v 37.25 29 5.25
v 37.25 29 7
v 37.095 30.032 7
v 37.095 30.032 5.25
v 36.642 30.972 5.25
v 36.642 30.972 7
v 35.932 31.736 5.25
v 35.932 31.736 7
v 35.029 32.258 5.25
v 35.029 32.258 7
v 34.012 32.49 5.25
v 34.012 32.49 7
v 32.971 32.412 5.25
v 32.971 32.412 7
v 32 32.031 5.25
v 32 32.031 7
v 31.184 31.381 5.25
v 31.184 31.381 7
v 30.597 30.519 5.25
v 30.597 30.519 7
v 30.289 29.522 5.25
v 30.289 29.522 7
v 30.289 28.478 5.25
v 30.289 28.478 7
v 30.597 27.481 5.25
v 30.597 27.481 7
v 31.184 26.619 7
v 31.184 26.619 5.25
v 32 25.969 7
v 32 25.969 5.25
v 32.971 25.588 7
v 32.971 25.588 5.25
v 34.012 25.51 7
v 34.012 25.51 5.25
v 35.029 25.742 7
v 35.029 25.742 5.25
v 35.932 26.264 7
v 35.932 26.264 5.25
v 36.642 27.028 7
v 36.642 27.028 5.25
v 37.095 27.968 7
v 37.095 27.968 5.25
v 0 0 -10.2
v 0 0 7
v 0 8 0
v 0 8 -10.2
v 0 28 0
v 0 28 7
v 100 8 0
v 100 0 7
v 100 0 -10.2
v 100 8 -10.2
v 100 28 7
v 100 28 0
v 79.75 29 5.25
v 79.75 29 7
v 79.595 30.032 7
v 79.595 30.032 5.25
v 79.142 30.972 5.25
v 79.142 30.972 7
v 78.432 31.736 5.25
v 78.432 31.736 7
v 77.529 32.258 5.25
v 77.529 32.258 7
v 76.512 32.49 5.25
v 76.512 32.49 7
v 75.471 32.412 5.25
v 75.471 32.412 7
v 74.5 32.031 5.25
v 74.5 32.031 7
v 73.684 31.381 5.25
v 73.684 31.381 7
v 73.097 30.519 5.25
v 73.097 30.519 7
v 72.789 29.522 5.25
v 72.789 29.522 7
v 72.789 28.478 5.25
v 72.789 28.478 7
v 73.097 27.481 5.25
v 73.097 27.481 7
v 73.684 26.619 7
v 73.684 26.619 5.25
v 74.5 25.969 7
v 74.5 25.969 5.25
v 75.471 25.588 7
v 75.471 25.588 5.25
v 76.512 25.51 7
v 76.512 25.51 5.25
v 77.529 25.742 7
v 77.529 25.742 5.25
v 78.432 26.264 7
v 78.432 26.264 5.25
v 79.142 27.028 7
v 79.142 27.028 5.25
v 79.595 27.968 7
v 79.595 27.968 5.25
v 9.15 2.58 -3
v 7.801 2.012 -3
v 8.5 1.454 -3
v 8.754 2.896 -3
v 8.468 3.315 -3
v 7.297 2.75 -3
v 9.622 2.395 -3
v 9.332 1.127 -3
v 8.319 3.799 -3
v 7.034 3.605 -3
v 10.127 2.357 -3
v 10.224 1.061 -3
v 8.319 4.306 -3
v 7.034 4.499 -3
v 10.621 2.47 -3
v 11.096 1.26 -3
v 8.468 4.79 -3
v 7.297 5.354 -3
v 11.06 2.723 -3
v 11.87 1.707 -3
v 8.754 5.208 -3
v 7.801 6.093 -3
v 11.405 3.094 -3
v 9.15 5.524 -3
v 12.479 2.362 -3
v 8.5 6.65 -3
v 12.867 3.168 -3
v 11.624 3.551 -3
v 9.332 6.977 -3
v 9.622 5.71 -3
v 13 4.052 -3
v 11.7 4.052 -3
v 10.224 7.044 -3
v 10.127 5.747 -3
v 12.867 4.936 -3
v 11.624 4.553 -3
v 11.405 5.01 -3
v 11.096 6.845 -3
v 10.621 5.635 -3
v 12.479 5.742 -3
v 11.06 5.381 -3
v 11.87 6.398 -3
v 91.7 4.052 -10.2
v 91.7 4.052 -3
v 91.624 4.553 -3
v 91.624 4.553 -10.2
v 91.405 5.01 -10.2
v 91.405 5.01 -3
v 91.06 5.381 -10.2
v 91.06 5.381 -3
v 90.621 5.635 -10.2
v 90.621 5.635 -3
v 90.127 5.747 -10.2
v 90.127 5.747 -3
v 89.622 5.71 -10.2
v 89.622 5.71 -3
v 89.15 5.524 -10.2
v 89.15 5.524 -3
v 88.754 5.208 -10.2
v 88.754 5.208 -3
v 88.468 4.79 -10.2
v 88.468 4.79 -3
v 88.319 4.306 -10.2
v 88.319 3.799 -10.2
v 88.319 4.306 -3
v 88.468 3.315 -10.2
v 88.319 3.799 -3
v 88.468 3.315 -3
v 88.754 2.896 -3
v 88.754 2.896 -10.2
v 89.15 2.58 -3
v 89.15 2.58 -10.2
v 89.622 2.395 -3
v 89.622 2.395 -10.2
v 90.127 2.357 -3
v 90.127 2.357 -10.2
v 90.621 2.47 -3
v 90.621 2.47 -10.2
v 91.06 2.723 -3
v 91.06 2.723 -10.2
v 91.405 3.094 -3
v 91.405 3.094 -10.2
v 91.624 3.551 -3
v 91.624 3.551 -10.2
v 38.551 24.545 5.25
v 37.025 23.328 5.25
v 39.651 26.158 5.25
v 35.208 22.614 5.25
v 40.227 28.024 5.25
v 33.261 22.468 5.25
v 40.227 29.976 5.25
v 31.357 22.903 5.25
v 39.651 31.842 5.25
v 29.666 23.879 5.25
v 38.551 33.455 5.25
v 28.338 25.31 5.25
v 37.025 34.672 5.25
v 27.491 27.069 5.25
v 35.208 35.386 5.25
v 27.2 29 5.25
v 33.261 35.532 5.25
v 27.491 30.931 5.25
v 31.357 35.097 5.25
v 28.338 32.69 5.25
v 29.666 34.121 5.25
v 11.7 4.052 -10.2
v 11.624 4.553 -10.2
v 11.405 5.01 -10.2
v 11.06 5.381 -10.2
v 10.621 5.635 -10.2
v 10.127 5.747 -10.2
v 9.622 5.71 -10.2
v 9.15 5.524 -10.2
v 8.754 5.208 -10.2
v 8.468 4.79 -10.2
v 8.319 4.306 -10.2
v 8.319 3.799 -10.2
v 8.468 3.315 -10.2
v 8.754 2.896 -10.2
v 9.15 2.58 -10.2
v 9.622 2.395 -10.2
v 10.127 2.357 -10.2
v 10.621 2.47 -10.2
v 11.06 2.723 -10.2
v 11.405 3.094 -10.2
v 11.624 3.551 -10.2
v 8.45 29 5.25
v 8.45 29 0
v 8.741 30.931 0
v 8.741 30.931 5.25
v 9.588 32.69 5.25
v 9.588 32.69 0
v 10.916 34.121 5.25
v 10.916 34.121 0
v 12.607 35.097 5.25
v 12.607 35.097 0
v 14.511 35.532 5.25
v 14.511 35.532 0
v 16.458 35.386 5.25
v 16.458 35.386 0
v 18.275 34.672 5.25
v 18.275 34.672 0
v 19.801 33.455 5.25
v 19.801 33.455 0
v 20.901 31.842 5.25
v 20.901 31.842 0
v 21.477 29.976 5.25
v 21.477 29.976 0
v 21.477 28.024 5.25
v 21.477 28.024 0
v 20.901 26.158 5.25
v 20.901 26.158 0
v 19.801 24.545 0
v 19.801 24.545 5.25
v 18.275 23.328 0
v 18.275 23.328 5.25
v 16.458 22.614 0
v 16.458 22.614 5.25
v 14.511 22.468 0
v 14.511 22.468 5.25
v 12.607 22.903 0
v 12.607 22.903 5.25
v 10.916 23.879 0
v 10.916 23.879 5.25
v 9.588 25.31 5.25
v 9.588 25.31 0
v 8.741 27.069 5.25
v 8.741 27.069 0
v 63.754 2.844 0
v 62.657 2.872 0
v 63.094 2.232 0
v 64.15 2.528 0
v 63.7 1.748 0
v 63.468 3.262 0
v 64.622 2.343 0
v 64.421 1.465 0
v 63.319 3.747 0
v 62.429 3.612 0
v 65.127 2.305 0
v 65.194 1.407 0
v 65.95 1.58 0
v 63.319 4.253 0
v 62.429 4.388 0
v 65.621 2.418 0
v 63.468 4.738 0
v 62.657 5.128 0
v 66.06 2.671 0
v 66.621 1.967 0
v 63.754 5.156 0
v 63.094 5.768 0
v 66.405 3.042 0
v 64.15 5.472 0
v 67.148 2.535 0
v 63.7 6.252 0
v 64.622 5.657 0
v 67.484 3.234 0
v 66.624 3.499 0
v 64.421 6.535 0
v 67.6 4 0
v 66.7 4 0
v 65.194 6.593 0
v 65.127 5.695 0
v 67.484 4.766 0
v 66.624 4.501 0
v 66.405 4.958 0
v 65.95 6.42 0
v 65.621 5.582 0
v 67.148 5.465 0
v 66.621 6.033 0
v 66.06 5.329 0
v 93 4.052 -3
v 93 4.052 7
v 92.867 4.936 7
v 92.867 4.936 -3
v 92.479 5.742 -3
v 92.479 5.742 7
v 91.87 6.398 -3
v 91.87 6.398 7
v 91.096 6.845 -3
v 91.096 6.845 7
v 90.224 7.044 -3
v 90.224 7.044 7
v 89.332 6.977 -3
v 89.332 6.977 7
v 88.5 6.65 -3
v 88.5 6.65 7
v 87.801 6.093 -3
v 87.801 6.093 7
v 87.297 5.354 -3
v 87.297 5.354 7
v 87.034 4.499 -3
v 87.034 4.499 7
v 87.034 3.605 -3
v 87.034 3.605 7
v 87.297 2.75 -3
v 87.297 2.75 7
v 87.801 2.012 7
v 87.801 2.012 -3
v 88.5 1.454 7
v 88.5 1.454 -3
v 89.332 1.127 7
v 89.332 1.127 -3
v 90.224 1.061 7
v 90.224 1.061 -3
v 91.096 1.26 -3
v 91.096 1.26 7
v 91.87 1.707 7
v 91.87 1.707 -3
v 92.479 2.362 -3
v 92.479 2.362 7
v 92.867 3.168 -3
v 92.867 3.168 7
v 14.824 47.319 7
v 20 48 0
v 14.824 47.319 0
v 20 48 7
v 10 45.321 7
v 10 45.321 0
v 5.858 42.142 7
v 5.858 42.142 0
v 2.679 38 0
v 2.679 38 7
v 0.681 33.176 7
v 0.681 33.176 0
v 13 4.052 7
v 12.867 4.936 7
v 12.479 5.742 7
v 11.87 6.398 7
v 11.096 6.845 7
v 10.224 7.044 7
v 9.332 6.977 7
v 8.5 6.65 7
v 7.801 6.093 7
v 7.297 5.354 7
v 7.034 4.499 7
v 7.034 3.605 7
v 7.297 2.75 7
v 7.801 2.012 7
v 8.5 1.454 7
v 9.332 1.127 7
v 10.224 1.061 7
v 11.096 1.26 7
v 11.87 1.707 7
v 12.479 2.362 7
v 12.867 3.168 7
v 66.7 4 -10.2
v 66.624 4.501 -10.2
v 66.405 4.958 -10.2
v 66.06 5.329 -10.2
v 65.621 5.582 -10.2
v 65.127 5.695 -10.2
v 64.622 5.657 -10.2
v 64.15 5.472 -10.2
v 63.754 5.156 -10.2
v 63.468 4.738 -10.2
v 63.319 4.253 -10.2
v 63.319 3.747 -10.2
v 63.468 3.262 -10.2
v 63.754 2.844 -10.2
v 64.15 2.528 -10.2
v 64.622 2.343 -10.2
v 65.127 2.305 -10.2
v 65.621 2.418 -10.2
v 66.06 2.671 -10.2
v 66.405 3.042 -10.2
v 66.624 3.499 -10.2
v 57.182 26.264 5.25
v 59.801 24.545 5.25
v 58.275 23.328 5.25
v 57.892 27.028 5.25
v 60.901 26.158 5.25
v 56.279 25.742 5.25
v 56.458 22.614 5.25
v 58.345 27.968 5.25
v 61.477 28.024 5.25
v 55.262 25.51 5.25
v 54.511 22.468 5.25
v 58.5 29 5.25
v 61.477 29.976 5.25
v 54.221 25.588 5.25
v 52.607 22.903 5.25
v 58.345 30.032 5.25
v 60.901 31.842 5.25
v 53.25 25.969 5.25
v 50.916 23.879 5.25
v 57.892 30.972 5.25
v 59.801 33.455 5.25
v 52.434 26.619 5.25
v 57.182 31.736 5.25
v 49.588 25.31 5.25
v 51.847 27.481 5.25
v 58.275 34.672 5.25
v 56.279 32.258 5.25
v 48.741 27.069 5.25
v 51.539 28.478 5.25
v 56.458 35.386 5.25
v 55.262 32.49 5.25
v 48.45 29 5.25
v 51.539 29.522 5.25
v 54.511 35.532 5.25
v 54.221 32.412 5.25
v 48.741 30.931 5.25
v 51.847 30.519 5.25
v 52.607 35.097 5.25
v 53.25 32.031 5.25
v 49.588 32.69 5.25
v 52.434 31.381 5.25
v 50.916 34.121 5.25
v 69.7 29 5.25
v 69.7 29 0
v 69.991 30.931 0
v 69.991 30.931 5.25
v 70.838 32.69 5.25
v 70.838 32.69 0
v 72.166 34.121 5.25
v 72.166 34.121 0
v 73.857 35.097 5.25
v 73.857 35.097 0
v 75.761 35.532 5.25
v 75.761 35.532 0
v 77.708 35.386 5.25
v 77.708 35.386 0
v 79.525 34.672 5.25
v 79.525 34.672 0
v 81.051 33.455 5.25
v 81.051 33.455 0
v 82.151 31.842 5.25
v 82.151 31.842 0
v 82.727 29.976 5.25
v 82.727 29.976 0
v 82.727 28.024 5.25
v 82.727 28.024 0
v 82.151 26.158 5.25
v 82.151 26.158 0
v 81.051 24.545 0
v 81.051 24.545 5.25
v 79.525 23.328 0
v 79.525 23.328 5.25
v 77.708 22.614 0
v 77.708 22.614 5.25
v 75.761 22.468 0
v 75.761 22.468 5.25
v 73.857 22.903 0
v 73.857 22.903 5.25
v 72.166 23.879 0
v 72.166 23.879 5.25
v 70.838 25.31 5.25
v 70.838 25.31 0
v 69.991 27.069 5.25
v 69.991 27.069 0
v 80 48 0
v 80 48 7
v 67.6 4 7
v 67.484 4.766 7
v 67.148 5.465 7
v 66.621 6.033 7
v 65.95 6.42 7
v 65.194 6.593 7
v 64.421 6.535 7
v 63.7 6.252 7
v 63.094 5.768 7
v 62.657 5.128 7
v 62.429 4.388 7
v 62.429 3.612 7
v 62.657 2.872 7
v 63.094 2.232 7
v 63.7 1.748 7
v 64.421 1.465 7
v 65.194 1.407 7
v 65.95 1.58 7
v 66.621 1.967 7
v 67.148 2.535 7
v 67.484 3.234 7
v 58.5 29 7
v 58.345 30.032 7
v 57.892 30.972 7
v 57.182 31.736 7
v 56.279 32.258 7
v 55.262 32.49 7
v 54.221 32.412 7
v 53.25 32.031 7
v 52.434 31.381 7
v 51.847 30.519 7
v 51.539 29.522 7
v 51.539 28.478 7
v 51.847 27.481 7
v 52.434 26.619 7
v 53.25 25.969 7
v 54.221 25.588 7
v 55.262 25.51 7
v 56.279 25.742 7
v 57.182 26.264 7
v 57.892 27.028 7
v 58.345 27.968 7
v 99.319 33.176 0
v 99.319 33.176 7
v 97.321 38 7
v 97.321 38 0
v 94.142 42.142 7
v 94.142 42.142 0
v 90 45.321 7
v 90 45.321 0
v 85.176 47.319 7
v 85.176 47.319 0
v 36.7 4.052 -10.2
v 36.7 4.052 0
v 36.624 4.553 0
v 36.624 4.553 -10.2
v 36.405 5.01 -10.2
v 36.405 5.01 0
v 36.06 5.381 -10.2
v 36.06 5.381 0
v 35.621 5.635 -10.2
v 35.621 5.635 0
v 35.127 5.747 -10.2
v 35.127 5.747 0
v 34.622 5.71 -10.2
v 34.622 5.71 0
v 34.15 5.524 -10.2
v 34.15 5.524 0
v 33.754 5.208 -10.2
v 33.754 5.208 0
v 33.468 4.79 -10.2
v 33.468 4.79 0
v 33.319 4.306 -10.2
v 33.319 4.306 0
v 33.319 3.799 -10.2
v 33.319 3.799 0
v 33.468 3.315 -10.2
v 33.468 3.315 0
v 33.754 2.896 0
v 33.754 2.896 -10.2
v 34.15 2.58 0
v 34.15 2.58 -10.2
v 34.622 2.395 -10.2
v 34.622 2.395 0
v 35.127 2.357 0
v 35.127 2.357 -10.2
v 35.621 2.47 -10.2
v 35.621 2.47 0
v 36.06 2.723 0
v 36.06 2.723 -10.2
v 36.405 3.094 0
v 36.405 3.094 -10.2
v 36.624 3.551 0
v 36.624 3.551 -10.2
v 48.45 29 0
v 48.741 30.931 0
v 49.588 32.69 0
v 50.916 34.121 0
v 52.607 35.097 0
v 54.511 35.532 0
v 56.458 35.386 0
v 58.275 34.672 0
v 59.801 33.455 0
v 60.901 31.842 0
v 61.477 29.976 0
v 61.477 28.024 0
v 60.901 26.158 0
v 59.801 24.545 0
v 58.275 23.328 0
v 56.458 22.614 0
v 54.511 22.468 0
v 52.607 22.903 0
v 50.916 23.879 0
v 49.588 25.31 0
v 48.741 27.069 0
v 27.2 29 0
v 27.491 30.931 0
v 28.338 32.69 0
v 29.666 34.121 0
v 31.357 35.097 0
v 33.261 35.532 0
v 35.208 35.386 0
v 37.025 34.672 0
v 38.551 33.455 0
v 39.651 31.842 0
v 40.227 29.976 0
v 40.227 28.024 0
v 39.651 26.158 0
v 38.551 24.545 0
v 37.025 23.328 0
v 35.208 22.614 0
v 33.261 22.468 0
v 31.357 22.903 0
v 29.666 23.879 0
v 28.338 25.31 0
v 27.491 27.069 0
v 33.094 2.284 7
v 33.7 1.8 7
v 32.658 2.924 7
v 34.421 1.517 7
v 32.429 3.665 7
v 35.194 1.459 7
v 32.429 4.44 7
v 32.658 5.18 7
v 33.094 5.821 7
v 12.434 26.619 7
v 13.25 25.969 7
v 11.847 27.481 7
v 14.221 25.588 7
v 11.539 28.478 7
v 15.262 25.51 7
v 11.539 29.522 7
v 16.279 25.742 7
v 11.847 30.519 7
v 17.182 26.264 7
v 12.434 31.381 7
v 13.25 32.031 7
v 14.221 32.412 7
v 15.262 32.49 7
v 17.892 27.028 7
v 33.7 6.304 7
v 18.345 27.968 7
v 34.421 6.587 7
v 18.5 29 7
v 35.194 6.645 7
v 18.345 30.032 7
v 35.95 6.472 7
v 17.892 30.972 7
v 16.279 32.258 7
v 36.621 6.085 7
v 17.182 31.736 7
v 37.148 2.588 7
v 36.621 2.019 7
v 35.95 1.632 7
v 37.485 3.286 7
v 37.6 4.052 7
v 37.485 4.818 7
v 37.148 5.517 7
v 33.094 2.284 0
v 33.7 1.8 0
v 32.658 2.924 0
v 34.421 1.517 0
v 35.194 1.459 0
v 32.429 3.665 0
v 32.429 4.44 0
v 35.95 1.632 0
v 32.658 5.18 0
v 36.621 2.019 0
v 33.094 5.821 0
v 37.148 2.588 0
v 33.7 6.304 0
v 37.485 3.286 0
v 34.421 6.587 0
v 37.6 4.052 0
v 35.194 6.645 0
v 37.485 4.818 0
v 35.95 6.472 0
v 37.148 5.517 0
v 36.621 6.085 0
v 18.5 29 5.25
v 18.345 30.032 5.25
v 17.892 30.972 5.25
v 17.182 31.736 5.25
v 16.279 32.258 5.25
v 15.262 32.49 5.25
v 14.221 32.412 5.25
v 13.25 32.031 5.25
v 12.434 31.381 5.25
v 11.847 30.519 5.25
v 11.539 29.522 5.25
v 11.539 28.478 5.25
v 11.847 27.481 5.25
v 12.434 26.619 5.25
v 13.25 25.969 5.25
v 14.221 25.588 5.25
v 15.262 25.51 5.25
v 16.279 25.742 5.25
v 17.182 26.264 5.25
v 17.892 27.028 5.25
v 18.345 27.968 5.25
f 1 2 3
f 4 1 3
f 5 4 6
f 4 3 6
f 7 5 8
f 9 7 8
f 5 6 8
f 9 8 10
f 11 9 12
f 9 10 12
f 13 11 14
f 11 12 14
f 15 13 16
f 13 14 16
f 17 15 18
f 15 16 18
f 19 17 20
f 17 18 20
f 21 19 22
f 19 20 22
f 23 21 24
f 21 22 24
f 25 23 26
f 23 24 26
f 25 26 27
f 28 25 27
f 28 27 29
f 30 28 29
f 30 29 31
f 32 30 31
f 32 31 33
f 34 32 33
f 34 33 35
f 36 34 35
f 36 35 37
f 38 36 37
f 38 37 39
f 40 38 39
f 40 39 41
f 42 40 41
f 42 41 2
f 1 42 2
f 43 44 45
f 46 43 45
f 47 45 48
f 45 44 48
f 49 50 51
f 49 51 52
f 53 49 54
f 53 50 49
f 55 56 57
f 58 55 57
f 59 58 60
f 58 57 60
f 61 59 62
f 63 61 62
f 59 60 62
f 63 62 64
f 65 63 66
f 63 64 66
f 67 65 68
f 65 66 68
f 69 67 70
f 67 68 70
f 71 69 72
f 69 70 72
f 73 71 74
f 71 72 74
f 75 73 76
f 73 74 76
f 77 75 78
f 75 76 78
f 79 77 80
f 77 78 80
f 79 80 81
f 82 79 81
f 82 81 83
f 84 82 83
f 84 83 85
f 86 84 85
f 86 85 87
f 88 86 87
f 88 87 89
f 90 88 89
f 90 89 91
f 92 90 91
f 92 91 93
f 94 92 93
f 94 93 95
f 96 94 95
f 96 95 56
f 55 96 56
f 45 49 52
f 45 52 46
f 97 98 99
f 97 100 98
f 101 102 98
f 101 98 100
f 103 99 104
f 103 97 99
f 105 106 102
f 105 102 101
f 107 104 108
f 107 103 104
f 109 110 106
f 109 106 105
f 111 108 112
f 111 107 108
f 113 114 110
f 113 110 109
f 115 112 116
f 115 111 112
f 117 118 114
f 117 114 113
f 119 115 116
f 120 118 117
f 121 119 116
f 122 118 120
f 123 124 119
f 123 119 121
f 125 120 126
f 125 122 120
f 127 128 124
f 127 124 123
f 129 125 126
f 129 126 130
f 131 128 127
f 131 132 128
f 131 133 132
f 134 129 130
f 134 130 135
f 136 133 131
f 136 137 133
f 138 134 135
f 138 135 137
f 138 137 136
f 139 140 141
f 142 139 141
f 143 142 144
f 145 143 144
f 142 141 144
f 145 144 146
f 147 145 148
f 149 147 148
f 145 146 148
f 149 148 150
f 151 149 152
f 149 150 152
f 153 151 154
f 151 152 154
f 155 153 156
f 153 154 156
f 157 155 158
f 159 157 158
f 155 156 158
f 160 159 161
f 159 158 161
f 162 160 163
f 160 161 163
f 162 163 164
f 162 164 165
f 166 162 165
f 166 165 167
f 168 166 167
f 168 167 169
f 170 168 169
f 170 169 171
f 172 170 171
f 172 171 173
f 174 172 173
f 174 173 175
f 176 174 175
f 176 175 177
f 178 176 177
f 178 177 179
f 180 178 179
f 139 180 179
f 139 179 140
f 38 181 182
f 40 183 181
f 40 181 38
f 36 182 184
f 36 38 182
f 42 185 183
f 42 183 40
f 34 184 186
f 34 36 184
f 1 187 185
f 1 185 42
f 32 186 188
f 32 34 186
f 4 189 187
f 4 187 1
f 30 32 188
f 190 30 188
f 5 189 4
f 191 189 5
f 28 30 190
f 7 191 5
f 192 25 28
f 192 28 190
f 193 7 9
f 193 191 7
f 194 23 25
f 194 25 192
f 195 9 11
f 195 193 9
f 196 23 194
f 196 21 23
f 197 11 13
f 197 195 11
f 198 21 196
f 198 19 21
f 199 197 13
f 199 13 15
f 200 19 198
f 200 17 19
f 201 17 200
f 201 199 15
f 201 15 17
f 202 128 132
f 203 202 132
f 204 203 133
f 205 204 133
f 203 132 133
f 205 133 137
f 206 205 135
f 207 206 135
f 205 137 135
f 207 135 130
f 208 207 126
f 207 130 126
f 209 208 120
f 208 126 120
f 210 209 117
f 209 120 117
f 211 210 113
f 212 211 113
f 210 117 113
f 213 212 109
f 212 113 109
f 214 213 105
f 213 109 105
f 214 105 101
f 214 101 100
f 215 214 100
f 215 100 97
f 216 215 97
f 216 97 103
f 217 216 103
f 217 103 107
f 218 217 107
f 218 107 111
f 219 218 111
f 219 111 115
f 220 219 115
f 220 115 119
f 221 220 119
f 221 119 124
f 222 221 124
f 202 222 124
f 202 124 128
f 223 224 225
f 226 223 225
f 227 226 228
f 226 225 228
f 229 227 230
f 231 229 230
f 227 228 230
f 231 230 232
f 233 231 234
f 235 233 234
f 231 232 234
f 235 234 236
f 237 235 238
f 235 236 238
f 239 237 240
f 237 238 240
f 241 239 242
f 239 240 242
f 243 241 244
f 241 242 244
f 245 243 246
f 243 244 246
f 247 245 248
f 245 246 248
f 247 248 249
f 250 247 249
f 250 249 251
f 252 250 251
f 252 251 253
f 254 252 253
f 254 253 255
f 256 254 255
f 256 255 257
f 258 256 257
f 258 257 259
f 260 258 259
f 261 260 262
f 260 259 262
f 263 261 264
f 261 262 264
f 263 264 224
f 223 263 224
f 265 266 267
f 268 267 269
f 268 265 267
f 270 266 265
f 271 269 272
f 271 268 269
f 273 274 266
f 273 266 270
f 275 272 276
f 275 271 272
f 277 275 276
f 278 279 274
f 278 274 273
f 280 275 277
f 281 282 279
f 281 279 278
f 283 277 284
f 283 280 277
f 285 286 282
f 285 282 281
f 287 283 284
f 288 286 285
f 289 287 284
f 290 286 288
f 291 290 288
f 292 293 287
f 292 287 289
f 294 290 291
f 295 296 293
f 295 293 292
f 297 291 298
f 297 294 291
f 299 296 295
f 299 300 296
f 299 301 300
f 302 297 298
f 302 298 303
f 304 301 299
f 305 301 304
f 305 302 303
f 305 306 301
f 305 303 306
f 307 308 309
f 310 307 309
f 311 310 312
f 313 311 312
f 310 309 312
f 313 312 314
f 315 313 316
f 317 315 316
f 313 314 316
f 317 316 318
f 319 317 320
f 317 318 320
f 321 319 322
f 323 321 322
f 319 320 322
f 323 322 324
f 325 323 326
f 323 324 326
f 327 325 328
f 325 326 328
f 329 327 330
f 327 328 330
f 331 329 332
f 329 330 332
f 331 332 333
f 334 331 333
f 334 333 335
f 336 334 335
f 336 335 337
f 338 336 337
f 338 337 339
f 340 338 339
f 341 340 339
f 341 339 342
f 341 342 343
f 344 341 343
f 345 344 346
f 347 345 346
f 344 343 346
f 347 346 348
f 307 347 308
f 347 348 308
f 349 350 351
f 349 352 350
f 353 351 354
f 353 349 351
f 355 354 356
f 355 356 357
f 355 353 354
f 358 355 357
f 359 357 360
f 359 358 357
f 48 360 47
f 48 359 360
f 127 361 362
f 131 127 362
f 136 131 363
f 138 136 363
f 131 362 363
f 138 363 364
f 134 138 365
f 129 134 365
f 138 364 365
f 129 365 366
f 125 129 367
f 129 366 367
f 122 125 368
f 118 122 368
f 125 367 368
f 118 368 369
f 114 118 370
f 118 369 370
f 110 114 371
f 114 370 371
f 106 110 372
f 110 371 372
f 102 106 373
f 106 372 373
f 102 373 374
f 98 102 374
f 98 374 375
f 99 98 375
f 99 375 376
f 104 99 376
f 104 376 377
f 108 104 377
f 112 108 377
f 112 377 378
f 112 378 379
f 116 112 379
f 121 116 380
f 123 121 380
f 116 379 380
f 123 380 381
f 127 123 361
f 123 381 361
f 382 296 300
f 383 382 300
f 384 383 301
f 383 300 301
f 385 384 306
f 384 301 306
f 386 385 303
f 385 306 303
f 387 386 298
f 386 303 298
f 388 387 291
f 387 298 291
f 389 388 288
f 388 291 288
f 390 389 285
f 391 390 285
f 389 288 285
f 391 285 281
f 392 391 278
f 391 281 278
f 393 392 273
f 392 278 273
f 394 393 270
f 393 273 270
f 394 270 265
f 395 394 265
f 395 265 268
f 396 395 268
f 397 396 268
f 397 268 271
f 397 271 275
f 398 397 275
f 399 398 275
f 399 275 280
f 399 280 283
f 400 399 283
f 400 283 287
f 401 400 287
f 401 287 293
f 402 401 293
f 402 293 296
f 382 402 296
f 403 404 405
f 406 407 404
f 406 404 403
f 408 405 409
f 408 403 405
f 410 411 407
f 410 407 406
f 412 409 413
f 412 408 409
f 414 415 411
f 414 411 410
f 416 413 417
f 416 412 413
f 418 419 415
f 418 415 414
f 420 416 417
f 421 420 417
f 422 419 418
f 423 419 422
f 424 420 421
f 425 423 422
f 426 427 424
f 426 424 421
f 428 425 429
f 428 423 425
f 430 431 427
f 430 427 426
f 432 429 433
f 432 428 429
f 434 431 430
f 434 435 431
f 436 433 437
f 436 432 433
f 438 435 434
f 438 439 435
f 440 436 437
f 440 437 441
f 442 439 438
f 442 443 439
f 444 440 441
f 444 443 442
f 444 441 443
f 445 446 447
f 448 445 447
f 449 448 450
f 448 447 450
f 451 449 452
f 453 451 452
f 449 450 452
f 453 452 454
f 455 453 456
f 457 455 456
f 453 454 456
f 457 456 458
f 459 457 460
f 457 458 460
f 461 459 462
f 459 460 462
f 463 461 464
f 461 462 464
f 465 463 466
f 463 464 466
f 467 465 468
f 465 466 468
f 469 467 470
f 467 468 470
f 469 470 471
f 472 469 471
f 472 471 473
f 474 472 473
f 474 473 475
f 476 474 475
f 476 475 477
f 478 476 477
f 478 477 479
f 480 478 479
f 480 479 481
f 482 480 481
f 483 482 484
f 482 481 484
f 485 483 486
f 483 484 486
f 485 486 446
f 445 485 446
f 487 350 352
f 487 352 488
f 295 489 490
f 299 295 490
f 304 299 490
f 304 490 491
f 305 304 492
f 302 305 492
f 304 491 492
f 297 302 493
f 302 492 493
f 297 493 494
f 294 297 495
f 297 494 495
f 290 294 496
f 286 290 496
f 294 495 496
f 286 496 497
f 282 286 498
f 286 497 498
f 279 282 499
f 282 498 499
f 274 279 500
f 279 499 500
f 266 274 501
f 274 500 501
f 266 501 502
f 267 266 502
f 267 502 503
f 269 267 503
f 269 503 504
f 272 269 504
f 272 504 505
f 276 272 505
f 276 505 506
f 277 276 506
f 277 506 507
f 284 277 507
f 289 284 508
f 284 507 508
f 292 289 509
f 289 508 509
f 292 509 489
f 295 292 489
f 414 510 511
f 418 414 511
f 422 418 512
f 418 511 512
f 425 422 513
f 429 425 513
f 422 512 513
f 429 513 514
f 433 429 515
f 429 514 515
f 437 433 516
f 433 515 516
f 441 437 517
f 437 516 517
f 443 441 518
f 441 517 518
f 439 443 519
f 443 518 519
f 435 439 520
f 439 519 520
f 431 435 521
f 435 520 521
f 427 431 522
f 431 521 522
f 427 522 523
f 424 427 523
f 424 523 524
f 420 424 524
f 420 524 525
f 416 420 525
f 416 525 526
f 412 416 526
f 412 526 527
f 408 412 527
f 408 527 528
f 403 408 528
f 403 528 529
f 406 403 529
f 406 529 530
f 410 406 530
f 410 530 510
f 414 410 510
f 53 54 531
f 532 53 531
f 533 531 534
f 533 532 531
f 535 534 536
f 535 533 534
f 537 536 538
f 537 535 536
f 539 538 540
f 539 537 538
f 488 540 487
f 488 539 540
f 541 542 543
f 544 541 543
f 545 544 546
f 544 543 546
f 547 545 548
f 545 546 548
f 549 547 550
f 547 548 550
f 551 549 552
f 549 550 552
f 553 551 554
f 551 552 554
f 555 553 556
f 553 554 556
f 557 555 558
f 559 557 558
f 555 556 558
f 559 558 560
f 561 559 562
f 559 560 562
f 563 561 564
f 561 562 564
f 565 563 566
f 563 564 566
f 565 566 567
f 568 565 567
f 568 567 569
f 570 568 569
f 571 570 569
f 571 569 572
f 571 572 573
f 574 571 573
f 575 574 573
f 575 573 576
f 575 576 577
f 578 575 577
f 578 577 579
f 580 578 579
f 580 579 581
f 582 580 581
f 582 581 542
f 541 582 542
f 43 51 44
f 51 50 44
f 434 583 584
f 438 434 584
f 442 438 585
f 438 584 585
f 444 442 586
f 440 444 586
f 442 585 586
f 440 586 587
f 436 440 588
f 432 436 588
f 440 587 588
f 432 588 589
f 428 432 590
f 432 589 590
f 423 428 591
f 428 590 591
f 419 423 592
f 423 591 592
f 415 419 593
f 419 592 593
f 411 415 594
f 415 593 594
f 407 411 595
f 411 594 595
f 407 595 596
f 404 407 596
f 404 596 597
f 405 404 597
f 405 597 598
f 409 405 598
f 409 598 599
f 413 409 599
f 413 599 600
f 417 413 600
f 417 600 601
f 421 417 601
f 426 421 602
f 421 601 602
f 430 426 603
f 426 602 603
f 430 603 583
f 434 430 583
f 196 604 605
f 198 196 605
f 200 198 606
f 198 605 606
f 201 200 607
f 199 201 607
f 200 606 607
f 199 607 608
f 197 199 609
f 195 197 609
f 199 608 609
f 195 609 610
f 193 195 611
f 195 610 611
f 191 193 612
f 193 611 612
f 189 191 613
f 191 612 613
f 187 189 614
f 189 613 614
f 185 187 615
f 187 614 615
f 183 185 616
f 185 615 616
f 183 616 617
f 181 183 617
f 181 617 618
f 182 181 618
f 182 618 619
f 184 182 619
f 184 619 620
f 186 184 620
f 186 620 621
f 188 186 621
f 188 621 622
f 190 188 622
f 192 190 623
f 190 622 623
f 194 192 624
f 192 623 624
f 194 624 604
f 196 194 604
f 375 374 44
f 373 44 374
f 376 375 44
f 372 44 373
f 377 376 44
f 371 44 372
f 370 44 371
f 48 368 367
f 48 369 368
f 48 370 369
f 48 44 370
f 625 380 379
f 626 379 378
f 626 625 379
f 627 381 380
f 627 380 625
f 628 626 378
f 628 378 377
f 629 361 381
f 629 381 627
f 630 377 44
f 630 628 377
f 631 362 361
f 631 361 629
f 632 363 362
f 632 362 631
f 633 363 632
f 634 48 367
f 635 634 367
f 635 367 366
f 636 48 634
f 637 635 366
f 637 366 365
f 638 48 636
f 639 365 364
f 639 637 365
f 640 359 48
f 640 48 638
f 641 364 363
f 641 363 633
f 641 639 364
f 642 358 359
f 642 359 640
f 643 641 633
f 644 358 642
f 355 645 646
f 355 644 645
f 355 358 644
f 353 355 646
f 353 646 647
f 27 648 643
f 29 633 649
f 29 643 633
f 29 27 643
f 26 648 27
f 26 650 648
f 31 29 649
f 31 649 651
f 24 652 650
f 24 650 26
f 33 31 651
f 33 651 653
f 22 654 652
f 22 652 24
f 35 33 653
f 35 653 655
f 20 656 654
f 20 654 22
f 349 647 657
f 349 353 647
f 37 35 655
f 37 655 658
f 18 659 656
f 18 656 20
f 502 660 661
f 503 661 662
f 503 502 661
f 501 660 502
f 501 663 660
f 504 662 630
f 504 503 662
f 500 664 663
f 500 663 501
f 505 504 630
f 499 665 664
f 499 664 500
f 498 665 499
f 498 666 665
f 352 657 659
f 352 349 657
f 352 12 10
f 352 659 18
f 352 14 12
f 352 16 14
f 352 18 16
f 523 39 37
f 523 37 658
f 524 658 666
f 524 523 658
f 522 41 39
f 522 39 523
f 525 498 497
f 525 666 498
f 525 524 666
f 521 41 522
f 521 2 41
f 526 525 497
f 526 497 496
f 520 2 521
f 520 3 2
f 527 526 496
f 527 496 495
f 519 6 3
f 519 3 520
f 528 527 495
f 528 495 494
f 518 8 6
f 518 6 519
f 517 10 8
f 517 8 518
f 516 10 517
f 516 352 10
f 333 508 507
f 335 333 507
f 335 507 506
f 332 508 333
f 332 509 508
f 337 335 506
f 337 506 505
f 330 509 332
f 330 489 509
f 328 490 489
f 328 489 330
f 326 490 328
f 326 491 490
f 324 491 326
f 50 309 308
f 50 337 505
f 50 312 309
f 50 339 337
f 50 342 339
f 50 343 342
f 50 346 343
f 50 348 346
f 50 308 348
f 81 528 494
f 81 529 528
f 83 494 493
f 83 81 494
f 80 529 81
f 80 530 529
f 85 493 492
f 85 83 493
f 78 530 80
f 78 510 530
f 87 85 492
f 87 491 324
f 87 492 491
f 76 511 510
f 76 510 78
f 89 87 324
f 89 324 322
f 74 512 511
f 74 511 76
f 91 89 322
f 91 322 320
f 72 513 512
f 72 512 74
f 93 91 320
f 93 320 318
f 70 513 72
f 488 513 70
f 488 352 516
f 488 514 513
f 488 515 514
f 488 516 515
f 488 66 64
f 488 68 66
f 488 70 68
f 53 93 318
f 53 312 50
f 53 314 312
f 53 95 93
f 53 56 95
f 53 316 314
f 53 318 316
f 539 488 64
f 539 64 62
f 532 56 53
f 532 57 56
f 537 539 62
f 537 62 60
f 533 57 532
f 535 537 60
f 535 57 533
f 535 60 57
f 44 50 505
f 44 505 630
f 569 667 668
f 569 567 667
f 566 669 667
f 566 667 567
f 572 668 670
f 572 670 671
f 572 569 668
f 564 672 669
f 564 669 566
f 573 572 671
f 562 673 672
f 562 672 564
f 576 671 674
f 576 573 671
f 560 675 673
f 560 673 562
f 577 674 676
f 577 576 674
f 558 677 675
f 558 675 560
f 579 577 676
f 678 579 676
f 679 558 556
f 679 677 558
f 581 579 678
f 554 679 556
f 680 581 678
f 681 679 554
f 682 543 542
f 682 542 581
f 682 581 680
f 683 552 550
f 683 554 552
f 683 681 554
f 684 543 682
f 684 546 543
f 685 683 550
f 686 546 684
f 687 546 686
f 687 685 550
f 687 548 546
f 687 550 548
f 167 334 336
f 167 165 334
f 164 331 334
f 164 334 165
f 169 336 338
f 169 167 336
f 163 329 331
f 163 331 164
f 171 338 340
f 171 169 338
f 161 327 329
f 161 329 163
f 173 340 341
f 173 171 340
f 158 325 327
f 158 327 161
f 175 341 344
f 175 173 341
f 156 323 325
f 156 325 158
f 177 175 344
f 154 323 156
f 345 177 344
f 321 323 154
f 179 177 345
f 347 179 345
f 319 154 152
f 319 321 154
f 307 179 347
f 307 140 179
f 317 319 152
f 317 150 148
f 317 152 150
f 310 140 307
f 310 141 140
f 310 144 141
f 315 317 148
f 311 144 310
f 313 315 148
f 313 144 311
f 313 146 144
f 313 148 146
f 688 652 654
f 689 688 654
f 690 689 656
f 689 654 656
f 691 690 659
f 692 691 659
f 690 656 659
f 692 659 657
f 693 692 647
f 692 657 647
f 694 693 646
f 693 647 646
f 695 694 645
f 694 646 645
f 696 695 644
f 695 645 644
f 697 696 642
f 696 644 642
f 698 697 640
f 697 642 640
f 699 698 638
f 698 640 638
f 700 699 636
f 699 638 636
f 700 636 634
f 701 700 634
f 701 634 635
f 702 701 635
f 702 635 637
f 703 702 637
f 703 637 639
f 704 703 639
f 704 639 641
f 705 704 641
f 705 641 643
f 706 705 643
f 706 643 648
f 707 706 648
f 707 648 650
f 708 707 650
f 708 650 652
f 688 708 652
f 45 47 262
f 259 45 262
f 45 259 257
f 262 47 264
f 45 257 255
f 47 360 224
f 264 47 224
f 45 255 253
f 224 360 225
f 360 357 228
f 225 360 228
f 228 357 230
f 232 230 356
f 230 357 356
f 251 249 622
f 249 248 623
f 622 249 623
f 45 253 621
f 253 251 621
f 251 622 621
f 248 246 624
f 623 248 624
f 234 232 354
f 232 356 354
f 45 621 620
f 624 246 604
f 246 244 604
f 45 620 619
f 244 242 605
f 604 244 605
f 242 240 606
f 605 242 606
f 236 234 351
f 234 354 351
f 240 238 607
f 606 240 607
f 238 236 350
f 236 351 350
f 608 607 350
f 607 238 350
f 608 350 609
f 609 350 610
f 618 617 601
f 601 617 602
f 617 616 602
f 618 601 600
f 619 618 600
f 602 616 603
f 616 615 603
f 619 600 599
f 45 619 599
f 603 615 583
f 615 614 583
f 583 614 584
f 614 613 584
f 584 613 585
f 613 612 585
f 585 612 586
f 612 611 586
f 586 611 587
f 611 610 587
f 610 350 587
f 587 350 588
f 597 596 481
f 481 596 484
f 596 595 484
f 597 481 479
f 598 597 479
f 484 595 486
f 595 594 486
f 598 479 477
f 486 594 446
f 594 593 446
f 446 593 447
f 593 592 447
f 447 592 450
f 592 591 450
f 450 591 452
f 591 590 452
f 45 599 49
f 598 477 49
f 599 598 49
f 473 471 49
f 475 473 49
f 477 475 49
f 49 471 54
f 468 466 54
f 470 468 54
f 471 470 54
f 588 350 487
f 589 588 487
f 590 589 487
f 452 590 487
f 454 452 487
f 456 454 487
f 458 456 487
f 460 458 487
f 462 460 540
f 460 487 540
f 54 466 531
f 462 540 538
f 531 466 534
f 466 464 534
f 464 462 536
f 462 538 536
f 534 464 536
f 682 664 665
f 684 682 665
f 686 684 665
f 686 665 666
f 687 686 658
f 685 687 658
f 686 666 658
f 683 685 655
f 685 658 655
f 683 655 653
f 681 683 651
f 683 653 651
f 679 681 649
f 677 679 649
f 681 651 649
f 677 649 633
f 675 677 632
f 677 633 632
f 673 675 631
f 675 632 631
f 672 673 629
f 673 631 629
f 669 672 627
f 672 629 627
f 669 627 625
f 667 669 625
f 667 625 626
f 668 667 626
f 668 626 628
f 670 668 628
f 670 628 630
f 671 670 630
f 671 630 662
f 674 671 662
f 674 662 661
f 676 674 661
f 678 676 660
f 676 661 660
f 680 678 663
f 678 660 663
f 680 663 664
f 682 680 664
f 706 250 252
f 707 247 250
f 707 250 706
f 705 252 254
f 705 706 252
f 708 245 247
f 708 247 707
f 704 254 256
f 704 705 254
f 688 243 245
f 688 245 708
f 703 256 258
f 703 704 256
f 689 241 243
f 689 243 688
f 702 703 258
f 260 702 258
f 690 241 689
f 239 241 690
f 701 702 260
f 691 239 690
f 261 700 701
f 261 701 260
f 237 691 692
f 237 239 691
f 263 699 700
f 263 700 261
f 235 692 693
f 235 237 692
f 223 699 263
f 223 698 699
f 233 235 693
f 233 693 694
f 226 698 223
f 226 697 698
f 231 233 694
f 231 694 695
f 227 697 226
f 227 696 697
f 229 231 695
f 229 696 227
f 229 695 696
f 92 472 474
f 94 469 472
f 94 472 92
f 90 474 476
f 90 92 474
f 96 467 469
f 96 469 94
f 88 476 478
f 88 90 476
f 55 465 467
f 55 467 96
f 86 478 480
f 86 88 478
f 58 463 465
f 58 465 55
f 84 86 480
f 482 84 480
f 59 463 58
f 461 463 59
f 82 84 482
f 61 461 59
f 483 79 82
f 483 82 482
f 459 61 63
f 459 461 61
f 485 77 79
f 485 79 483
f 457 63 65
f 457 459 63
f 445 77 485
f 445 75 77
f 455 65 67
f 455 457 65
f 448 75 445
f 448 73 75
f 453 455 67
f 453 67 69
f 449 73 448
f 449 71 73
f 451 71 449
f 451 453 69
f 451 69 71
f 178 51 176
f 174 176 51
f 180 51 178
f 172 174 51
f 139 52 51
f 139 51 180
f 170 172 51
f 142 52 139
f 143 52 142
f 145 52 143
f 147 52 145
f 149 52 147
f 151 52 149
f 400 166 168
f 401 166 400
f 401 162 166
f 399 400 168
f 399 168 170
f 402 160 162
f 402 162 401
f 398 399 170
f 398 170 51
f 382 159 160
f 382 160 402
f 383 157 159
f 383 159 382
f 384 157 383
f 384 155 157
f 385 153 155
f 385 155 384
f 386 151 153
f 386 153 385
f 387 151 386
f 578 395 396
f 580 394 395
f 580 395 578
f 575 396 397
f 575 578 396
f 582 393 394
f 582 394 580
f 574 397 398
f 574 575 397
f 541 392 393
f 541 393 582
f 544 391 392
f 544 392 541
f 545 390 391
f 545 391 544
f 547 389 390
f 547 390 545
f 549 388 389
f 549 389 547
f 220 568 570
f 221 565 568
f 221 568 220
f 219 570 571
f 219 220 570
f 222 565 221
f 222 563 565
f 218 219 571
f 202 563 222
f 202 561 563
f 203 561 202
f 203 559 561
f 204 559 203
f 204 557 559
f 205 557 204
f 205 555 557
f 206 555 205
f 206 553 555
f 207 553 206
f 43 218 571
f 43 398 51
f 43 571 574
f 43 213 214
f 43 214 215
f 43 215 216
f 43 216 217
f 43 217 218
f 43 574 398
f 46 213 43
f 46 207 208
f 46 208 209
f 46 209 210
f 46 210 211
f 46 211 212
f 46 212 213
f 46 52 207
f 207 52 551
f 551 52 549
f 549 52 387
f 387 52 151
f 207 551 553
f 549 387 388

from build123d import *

# Parameters (mm, degrees)
SKETCH1_W           = 100
SKETCH1_H           = 48
BOSS_EXTRUDE1_DEPTH = 7
CUT_EXTRUDE1_REACH  = 113.144
SKETCH2_R           = 3.5
SKETCH3_W           = 100
SKETCH3_H           = 8
BOSS_EXTRUDE2_DEPTH = 10.2
SKETCH4_R           = 6.55
CUT_EXTRUDE2_DEPTH  = 5.25
SKETCH5_R           = 2.6
CUT_EXTRUDE3_DEPTH  = 7
SKETCH7_R           = 1.7
CUT_EXTRUDE4_DEPTH  = 112.391382072
CUT_EXTRUDE5_REACH  = 114.249
SKETCH8_R           = 1.7
SKETCH9_R           = 3
CUT_EXTRUDE6_DEPTH  = 10
FILLET1_R           = 20


with BuildPart() as part:
    # Sketch1 → Boss-Extrude1 (new body)
    with BuildSketch(Plane.XY):
        with Locations((50, 24)):
            Rectangle(SKETCH1_W, SKETCH1_H)
    extrude(amount=BOSS_EXTRUDE1_DEPTH)

    # Sketch2 → Cut-Extrude1 (cut, up to next)
    with BuildSketch(Plane.XY.offset(7), mode=Mode.PRIVATE) as cut_extrude1_sk1:
        with Locations((15, 29)):
            Circle(SKETCH2_R)
    cut_extrude1_tool1 = extrude(cut_extrude1_sk1.sketch, amount=-CUT_EXTRUDE1_REACH, mode=Mode.PRIVATE) & part.part
    # Sketch2 → Cut-Extrude1 (cut, up to next)
    with BuildSketch(Plane.XY.offset(7), mode=Mode.PRIVATE) as cut_extrude1_sk2:
        with Locations((33.75, 29)):
            Circle(SKETCH2_R)
    cut_extrude1_tool2 = extrude(cut_extrude1_sk2.sketch, amount=-CUT_EXTRUDE1_REACH, mode=Mode.PRIVATE) & part.part
    # Sketch2 → Cut-Extrude1 (cut, up to next)
    with BuildSketch(Plane.XY.offset(7), mode=Mode.PRIVATE) as cut_extrude1_sk3:
        with Locations((55, 29)):
            Circle(SKETCH2_R)
    cut_extrude1_tool3 = extrude(cut_extrude1_sk3.sketch, amount=-CUT_EXTRUDE1_REACH, mode=Mode.PRIVATE) & part.part
    # Sketch2 → Cut-Extrude1 (cut, up to next)
    with BuildSketch(Plane.XY.offset(7), mode=Mode.PRIVATE) as cut_extrude1_sk4:
        with Locations((76.25, 29)):
            Circle(SKETCH2_R)
    cut_extrude1_tool4 = extrude(cut_extrude1_sk4.sketch, amount=-CUT_EXTRUDE1_REACH, mode=Mode.PRIVATE) & part.part
    add(cut_extrude1_tool1.solids().sort_by_distance((15, 29, 7))[0], mode=Mode.SUBTRACT)
    add(cut_extrude1_tool2.solids().sort_by_distance((33.75, 29, 7))[0], mode=Mode.SUBTRACT)
    add(cut_extrude1_tool3.solids().sort_by_distance((55, 29, 7))[0], mode=Mode.SUBTRACT)
    add(cut_extrude1_tool4.solids().sort_by_distance((76.25, 29, 7))[0], mode=Mode.SUBTRACT)

    # Sketch3 → Boss-Extrude2 (add)
    with BuildSketch(Plane(origin=(0, 0, 0), x_dir=(-1, 0, 0), z_dir=(0, 0, -1))):
        with Locations((-50, 4)):
            Rectangle(SKETCH3_W, SKETCH3_H)
    extrude(amount=BOSS_EXTRUDE2_DEPTH)

    # Sketch4 → Cut-Extrude2 (cut)
    with BuildSketch(Plane(origin=(0, 0, 0), x_dir=(-1, 0, 0), z_dir=(0, 0, -1))):
        with Locations((-76.25, 29)):
            Circle(SKETCH4_R)
        with Locations((-55, 29)):
            Circle(SKETCH4_R)
        with Locations((-33.75, 29)):
            Circle(SKETCH4_R)
        with Locations((-15, 29)):
            Circle(SKETCH4_R)
    extrude(amount=-CUT_EXTRUDE2_DEPTH, mode=Mode.SUBTRACT)

    # Sketch5 → Cut-Extrude3 (cut)
    with BuildSketch(Plane.XY.offset(7)):
        with Locations((35.000022648, 4.052132501)):
            Circle(SKETCH5_R)
        with Locations((64.999977352, 4)):
            Circle(SKETCH5_R)
    extrude(amount=-CUT_EXTRUDE3_DEPTH, mode=Mode.SUBTRACT)

    # Sketch7 → Cut-Extrude4 (cut, through all)
    with BuildSketch(Plane.XY):
        with Locations((35.000022648, 4.052132501)):
            Circle(SKETCH7_R)
        with Locations((64.999977352, 4)):
            Circle(SKETCH7_R)
    extrude(amount=-CUT_EXTRUDE4_DEPTH, mode=Mode.SUBTRACT)

    # Sketch8 → Cut-Extrude5 (cut, up to next)
    with BuildSketch(Plane.XY.offset(7), mode=Mode.PRIVATE) as cut_extrude5_sk1:
        with Locations((10, 4.052132501)):
            Circle(SKETCH8_R)
    cut_extrude5_tool1 = extrude(cut_extrude5_sk1.sketch, amount=-CUT_EXTRUDE5_REACH, mode=Mode.PRIVATE) & part.part
    # Sketch8 → Cut-Extrude5 (cut, up to next)
    with BuildSketch(Plane.XY.offset(7), mode=Mode.PRIVATE) as cut_extrude5_sk2:
        with Locations((90, 4.052132501)):
            Circle(SKETCH8_R)
    cut_extrude5_tool2 = extrude(cut_extrude5_sk2.sketch, amount=-CUT_EXTRUDE5_REACH, mode=Mode.PRIVATE) & part.part
    add(cut_extrude5_tool1.solids().sort_by_distance((10, 4.052133, 7))[0], mode=Mode.SUBTRACT)
    add(cut_extrude5_tool2.solids().sort_by_distance((90, 4.052133, 7))[0], mode=Mode.SUBTRACT)

    # Sketch9 → Cut-Extrude6 (cut)
    with BuildSketch(Plane.XY.offset(7)):
        with Locations((10, 4.052132501)):
            Circle(SKETCH9_R)
        with Locations((90, 4.052132501)):
            Circle(SKETCH9_R)
    extrude(amount=-CUT_EXTRUDE6_DEPTH, mode=Mode.SUBTRACT)

    # Fillet1
    fillet1_edges = [part.edges().sort_by_distance(p)[0] for p in [
        (0, 48, 3.5),
        (100, 48, 3.5),
    ]]
    fillet(fillet1_edges, radius=FILLET1_R)


solid = part.part
